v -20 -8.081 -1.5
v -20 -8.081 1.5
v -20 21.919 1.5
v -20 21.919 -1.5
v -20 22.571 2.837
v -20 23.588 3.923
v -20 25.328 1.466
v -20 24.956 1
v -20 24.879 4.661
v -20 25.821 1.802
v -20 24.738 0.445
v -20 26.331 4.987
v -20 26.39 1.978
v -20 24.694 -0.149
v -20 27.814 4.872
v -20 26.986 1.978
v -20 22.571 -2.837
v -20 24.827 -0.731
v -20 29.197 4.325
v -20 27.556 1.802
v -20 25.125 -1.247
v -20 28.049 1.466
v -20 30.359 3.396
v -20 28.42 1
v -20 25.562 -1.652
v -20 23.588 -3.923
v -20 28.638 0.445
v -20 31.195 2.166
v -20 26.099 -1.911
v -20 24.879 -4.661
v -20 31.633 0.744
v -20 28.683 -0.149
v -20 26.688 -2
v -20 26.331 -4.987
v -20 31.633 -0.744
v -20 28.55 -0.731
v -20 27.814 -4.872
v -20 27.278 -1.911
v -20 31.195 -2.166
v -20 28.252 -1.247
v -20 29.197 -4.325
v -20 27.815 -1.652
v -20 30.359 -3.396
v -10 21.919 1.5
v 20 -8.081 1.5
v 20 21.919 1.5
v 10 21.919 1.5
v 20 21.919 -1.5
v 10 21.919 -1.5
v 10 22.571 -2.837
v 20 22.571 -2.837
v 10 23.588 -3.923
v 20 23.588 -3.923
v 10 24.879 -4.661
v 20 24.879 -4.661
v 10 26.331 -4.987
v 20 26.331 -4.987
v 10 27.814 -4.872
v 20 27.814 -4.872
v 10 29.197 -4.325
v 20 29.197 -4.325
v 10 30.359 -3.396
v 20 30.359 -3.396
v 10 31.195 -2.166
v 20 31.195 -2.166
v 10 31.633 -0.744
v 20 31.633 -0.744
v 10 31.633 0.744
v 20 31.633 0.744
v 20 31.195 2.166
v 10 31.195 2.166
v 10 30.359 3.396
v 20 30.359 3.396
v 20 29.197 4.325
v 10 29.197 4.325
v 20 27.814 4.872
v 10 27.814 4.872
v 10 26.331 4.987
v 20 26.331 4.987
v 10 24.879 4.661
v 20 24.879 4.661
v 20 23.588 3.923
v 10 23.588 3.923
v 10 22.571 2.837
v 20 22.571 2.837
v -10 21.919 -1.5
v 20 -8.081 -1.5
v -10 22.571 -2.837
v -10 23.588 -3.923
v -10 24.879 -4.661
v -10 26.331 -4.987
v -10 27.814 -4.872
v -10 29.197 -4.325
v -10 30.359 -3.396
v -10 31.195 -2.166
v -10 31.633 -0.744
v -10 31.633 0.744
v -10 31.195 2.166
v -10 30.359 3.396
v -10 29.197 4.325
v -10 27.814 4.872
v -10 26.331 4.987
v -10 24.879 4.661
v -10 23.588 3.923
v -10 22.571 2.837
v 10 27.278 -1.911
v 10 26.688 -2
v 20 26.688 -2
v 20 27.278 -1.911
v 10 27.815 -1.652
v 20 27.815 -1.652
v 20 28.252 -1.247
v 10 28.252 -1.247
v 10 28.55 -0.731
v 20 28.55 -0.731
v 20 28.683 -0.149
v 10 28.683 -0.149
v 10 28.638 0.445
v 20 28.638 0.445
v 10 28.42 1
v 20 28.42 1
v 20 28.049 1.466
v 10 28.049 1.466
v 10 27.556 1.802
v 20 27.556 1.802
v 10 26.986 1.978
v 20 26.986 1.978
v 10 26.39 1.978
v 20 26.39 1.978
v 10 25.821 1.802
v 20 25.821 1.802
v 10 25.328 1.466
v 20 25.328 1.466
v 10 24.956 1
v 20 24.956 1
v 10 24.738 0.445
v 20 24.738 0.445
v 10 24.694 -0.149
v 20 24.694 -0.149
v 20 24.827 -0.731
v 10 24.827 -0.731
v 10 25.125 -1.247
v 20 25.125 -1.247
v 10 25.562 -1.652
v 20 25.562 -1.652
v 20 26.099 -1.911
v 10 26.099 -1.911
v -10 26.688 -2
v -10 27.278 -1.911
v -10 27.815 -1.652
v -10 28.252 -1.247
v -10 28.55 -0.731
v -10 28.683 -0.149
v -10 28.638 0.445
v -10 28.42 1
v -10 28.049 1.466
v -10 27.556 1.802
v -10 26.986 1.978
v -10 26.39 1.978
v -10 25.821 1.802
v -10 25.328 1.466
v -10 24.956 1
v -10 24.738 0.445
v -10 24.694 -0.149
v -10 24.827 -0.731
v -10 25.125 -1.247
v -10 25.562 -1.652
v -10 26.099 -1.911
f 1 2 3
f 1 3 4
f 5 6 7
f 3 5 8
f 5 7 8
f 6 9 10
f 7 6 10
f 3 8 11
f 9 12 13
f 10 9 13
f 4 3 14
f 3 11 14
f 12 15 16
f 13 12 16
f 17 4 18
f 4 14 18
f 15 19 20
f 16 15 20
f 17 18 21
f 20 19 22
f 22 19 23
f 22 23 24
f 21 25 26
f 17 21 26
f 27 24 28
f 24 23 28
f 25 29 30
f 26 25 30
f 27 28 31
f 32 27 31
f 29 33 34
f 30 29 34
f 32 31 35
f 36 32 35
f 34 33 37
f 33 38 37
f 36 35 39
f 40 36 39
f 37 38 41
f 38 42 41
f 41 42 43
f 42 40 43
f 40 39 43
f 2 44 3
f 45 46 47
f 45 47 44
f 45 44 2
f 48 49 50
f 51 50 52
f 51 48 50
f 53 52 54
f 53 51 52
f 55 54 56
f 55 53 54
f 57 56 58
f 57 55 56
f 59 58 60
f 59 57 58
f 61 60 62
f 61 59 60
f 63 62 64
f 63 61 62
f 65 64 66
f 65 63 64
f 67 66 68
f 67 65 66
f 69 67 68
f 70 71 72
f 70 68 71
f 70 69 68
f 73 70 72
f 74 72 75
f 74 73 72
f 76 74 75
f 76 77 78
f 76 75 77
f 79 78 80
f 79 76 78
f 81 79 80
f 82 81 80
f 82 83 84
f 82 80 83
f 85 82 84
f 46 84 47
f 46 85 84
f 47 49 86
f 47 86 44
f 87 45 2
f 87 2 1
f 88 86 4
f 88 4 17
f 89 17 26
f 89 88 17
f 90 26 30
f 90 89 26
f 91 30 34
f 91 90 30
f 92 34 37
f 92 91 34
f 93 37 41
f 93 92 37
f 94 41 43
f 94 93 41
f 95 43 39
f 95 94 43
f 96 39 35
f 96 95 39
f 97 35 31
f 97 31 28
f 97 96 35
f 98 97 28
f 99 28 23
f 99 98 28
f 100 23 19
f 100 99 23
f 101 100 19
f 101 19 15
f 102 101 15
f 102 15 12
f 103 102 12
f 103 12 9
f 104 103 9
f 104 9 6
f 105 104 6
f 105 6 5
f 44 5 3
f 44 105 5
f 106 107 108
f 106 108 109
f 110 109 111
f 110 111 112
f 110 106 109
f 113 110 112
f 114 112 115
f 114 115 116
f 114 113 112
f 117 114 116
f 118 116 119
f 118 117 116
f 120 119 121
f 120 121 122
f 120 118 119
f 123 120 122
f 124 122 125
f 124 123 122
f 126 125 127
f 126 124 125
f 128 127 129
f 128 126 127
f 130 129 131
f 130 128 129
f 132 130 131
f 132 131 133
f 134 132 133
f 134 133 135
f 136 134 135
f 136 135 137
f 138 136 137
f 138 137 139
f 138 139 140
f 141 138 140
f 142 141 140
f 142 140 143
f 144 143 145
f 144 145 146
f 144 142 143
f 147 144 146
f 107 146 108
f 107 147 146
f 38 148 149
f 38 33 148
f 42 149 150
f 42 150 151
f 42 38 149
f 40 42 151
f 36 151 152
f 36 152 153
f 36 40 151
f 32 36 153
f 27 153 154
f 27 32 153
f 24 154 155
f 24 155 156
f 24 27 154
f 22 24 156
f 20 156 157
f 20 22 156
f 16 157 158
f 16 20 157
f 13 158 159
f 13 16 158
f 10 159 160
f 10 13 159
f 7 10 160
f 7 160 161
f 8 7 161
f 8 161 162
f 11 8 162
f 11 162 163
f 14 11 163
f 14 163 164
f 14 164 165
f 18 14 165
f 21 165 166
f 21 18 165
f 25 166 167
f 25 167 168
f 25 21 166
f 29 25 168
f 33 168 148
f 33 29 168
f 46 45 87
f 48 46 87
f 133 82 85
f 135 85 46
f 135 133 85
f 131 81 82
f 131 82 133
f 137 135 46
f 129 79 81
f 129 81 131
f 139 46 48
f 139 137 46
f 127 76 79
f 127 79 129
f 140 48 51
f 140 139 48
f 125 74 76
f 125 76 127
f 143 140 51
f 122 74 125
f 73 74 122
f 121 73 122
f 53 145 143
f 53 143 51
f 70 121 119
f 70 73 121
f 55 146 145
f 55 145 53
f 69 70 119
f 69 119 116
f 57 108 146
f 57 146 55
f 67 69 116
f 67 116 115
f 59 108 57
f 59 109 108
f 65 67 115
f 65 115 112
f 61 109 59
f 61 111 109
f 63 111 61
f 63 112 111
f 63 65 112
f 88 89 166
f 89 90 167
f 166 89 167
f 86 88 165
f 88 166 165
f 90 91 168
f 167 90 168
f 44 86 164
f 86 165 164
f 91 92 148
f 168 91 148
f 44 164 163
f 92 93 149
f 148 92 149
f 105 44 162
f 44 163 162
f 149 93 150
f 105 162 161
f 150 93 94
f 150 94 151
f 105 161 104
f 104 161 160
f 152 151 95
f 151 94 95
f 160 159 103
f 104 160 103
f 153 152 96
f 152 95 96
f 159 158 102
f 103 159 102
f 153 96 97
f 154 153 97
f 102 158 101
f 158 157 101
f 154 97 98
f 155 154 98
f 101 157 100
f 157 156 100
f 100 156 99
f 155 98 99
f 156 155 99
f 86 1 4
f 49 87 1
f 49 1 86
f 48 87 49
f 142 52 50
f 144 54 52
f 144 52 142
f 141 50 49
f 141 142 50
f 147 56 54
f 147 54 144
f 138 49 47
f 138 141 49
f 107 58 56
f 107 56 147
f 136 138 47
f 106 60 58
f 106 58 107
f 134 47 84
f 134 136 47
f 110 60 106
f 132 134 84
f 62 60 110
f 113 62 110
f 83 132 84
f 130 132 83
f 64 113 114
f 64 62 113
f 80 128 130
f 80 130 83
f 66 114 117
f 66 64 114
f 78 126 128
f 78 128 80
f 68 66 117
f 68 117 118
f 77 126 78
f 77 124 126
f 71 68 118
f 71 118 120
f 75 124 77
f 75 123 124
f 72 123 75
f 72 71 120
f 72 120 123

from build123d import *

# Parameters (mm, degrees)
SKETCH2_R           = 2
BOSS_EXTRUDE1_DEPTH = 20
SKETCH3_R           = 2
CUT_EXTRUDE1_DEPTH  = 10


with BuildPart() as part:
    # Sketch2 → Boss-Extrude1 (new, symmetric)
    with BuildSketch(Plane(origin=(0, 0, 0), x_dir=(0, 0, -1), z_dir=(1, 0, 0))):
        with BuildLine():
            Line((-1.5, 21.918644487), (-1.5, -8.081355513))
            Line((-1.5, -8.081355513), (1.5, -8.081355513))
            Line((1.5, -8.081355513), (1.5, 21.918644487))
            ThreePointArc((1.5, 21.918644487), (0, 31.688340494), (-1.5, 21.918644487))
        make_face()
        with Locations((0, 26.688340494)):
            Circle(SKETCH2_R, mode=Mode.SUBTRACT)
    extrude(amount=BOSS_EXTRUDE1_DEPTH, both=True)

    # Sketch3 → Cut-Extrude1 (cut, symmetric)
    with BuildSketch(Plane(origin=(0, 0, 0), x_dir=(0, 0, -1), z_dir=(1, 0, 0))):
        with BuildLine():
            Line((1.5, 21.918644487), (-1.5, 21.918644487))
            ThreePointArc((-1.5, 21.918644487), (0, 31.688340494), (1.5, 21.918644487))
        make_face()
        with Locations((0, 26.688340494)):
            Circle(SKETCH3_R, mode=Mode.SUBTRACT)
    extrude(amount=CUT_EXTRUDE1_DEPTH, both=True, mode=Mode.SUBTRACT)


solid = part.part
